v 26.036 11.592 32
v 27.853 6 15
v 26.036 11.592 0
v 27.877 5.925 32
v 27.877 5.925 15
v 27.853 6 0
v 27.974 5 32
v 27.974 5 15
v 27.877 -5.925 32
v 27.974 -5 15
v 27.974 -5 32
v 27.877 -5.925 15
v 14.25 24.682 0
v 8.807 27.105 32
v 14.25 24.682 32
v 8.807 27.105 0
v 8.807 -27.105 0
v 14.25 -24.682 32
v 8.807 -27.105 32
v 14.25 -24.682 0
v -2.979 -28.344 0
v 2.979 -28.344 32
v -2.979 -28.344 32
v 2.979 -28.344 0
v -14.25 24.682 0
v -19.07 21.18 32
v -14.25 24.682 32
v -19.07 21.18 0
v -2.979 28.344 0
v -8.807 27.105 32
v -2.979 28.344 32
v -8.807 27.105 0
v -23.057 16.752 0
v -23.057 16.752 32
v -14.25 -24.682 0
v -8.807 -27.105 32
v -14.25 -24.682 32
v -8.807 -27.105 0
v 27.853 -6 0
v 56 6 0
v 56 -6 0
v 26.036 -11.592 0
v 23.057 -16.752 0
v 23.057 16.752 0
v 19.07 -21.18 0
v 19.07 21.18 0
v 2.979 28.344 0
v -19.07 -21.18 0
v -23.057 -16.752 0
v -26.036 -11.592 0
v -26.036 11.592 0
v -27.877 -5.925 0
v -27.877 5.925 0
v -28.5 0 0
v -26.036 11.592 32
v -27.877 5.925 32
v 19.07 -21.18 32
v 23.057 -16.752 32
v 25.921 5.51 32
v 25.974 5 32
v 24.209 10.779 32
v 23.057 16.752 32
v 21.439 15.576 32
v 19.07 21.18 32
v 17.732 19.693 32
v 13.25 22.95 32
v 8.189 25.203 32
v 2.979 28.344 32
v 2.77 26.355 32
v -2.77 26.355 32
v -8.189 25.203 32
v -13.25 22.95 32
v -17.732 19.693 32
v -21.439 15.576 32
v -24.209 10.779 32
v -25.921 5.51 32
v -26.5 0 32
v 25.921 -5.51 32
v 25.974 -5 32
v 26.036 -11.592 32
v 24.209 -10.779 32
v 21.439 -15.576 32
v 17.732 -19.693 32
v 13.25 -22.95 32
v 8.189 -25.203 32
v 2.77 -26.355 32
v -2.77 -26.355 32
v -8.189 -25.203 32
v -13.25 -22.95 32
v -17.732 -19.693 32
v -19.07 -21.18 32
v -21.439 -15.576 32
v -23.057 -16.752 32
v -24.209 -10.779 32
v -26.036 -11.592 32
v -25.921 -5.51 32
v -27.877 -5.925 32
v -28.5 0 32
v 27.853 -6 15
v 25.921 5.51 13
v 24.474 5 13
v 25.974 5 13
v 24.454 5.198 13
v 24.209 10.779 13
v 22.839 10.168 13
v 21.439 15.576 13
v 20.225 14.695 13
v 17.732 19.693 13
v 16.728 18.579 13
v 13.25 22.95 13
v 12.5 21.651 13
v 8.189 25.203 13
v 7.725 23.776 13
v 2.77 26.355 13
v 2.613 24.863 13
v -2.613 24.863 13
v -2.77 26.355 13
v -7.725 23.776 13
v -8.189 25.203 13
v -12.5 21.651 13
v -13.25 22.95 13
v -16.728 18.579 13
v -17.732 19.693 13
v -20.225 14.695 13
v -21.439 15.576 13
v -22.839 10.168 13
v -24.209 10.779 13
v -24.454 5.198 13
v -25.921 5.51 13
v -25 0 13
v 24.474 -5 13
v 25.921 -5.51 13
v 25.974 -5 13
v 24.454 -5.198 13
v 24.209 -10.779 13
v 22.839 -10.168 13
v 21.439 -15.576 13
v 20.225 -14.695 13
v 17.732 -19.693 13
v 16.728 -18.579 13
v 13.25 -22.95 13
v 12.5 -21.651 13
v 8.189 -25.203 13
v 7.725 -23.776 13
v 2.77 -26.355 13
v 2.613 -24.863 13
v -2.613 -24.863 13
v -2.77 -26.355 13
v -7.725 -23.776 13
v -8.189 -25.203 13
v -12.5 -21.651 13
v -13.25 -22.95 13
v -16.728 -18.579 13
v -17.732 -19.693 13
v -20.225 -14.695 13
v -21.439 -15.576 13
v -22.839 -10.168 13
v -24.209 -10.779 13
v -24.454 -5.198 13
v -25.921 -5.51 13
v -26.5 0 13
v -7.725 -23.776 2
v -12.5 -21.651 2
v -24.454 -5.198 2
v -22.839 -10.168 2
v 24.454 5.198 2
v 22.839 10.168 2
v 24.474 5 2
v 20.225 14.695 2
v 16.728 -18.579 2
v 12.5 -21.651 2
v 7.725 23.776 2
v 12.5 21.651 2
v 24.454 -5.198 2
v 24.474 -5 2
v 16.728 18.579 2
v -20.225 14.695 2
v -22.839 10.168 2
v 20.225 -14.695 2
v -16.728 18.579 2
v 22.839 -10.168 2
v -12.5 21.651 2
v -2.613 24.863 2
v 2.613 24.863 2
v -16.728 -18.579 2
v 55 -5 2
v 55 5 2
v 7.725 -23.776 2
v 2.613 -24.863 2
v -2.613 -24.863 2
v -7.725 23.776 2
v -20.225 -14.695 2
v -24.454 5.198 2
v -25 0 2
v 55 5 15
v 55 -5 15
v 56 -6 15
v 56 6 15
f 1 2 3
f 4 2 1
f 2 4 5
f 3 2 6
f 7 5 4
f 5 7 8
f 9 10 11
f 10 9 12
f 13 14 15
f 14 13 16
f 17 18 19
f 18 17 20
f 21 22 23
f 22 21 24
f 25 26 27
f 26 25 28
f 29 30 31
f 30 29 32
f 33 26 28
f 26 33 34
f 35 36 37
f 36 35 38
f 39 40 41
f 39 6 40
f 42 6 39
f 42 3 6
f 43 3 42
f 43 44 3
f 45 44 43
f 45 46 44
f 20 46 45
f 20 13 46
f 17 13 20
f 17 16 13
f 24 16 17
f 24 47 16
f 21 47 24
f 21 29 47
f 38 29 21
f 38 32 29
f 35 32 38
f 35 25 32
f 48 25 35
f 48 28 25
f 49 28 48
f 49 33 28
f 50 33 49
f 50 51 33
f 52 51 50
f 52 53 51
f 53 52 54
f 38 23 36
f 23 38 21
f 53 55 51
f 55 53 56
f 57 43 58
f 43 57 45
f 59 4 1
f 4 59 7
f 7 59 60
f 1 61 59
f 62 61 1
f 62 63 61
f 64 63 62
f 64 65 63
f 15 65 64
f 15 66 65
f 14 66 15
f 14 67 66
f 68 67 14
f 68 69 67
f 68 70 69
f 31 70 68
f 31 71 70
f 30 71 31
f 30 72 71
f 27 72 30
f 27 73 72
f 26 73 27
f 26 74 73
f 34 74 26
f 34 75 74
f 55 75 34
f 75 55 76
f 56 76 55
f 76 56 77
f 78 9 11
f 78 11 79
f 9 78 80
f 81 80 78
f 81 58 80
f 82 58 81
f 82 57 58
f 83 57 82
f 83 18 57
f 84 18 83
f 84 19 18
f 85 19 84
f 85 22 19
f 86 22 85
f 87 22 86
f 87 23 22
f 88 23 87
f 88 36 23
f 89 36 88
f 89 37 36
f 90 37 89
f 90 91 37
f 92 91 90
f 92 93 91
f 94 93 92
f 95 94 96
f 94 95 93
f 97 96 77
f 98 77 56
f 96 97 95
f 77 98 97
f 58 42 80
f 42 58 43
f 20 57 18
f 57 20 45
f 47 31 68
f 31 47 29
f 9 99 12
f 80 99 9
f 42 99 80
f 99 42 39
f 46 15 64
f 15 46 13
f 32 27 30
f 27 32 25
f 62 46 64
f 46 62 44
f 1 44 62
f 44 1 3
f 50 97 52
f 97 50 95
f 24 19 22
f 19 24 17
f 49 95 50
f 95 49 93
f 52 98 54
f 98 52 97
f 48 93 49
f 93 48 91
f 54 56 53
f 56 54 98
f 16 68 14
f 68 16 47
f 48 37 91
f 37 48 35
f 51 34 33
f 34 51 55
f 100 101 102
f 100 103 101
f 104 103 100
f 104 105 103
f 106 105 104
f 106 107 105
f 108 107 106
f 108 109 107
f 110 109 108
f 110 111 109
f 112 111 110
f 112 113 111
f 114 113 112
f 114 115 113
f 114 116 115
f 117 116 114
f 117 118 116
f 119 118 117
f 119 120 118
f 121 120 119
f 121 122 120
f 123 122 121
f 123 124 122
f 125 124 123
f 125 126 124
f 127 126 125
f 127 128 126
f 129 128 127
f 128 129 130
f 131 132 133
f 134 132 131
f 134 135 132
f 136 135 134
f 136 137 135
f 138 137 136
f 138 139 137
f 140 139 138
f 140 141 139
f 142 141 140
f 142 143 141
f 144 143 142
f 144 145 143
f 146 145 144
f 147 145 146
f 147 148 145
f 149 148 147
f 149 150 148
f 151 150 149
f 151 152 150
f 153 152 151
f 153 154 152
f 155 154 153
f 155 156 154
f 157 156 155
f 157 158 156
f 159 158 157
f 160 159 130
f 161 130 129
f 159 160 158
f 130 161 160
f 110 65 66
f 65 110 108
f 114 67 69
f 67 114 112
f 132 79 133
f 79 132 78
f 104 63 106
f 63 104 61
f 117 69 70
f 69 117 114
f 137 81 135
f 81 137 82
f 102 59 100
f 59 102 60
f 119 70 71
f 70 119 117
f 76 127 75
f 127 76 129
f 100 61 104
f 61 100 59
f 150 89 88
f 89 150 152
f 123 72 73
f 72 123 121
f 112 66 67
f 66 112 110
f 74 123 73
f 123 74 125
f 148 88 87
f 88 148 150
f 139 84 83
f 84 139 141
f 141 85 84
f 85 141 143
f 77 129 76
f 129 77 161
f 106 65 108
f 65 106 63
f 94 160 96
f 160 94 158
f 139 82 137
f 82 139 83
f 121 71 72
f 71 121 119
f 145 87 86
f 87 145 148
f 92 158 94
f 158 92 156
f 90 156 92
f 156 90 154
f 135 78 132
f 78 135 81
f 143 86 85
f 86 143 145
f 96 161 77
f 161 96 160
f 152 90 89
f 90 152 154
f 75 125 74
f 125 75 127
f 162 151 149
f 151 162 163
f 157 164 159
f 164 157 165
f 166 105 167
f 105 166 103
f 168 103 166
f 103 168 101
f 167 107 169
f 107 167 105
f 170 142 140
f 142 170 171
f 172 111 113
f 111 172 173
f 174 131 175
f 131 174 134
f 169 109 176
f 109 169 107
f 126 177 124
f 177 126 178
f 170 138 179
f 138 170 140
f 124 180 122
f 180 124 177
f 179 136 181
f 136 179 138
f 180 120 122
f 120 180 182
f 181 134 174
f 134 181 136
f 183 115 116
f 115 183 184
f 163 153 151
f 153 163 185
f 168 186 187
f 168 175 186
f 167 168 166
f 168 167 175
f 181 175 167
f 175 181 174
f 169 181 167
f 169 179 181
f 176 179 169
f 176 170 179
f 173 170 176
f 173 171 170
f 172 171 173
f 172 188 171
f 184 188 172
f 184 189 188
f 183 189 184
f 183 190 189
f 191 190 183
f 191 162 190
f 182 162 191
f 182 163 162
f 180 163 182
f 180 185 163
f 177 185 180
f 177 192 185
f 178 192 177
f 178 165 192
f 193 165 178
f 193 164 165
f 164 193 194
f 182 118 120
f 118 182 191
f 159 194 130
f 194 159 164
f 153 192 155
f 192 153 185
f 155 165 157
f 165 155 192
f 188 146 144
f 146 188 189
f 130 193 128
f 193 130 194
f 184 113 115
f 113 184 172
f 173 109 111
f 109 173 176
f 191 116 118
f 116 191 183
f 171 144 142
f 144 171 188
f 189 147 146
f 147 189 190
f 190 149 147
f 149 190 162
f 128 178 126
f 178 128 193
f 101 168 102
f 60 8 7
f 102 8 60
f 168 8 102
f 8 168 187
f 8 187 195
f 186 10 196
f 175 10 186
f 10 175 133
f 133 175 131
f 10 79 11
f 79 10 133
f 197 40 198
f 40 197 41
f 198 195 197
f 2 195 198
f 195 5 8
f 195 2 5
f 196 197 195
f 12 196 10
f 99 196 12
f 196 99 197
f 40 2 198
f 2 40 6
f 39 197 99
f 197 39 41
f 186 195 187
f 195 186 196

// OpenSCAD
difference(){
    cylinder(d=53+4,h=32);
    translate([0,0,2+11])cylinder(d=53,h=32);
    translate([0,0,2])cylinder(d=50,h=32);
    translate([40,0,32/2+2])cube([32,12-2,32],center=true);
}

difference(){
    translate([40,0,15/2])cube([32,12,15],center=true);
    translate([40-5,0,32/2+2])cube([32-2+10,12-2,32],center=true);
    translate([0,0,2+11])cylinder(d=53,h=32);
    translate([0,0,2])cylinder(d=50,h=32);
}
